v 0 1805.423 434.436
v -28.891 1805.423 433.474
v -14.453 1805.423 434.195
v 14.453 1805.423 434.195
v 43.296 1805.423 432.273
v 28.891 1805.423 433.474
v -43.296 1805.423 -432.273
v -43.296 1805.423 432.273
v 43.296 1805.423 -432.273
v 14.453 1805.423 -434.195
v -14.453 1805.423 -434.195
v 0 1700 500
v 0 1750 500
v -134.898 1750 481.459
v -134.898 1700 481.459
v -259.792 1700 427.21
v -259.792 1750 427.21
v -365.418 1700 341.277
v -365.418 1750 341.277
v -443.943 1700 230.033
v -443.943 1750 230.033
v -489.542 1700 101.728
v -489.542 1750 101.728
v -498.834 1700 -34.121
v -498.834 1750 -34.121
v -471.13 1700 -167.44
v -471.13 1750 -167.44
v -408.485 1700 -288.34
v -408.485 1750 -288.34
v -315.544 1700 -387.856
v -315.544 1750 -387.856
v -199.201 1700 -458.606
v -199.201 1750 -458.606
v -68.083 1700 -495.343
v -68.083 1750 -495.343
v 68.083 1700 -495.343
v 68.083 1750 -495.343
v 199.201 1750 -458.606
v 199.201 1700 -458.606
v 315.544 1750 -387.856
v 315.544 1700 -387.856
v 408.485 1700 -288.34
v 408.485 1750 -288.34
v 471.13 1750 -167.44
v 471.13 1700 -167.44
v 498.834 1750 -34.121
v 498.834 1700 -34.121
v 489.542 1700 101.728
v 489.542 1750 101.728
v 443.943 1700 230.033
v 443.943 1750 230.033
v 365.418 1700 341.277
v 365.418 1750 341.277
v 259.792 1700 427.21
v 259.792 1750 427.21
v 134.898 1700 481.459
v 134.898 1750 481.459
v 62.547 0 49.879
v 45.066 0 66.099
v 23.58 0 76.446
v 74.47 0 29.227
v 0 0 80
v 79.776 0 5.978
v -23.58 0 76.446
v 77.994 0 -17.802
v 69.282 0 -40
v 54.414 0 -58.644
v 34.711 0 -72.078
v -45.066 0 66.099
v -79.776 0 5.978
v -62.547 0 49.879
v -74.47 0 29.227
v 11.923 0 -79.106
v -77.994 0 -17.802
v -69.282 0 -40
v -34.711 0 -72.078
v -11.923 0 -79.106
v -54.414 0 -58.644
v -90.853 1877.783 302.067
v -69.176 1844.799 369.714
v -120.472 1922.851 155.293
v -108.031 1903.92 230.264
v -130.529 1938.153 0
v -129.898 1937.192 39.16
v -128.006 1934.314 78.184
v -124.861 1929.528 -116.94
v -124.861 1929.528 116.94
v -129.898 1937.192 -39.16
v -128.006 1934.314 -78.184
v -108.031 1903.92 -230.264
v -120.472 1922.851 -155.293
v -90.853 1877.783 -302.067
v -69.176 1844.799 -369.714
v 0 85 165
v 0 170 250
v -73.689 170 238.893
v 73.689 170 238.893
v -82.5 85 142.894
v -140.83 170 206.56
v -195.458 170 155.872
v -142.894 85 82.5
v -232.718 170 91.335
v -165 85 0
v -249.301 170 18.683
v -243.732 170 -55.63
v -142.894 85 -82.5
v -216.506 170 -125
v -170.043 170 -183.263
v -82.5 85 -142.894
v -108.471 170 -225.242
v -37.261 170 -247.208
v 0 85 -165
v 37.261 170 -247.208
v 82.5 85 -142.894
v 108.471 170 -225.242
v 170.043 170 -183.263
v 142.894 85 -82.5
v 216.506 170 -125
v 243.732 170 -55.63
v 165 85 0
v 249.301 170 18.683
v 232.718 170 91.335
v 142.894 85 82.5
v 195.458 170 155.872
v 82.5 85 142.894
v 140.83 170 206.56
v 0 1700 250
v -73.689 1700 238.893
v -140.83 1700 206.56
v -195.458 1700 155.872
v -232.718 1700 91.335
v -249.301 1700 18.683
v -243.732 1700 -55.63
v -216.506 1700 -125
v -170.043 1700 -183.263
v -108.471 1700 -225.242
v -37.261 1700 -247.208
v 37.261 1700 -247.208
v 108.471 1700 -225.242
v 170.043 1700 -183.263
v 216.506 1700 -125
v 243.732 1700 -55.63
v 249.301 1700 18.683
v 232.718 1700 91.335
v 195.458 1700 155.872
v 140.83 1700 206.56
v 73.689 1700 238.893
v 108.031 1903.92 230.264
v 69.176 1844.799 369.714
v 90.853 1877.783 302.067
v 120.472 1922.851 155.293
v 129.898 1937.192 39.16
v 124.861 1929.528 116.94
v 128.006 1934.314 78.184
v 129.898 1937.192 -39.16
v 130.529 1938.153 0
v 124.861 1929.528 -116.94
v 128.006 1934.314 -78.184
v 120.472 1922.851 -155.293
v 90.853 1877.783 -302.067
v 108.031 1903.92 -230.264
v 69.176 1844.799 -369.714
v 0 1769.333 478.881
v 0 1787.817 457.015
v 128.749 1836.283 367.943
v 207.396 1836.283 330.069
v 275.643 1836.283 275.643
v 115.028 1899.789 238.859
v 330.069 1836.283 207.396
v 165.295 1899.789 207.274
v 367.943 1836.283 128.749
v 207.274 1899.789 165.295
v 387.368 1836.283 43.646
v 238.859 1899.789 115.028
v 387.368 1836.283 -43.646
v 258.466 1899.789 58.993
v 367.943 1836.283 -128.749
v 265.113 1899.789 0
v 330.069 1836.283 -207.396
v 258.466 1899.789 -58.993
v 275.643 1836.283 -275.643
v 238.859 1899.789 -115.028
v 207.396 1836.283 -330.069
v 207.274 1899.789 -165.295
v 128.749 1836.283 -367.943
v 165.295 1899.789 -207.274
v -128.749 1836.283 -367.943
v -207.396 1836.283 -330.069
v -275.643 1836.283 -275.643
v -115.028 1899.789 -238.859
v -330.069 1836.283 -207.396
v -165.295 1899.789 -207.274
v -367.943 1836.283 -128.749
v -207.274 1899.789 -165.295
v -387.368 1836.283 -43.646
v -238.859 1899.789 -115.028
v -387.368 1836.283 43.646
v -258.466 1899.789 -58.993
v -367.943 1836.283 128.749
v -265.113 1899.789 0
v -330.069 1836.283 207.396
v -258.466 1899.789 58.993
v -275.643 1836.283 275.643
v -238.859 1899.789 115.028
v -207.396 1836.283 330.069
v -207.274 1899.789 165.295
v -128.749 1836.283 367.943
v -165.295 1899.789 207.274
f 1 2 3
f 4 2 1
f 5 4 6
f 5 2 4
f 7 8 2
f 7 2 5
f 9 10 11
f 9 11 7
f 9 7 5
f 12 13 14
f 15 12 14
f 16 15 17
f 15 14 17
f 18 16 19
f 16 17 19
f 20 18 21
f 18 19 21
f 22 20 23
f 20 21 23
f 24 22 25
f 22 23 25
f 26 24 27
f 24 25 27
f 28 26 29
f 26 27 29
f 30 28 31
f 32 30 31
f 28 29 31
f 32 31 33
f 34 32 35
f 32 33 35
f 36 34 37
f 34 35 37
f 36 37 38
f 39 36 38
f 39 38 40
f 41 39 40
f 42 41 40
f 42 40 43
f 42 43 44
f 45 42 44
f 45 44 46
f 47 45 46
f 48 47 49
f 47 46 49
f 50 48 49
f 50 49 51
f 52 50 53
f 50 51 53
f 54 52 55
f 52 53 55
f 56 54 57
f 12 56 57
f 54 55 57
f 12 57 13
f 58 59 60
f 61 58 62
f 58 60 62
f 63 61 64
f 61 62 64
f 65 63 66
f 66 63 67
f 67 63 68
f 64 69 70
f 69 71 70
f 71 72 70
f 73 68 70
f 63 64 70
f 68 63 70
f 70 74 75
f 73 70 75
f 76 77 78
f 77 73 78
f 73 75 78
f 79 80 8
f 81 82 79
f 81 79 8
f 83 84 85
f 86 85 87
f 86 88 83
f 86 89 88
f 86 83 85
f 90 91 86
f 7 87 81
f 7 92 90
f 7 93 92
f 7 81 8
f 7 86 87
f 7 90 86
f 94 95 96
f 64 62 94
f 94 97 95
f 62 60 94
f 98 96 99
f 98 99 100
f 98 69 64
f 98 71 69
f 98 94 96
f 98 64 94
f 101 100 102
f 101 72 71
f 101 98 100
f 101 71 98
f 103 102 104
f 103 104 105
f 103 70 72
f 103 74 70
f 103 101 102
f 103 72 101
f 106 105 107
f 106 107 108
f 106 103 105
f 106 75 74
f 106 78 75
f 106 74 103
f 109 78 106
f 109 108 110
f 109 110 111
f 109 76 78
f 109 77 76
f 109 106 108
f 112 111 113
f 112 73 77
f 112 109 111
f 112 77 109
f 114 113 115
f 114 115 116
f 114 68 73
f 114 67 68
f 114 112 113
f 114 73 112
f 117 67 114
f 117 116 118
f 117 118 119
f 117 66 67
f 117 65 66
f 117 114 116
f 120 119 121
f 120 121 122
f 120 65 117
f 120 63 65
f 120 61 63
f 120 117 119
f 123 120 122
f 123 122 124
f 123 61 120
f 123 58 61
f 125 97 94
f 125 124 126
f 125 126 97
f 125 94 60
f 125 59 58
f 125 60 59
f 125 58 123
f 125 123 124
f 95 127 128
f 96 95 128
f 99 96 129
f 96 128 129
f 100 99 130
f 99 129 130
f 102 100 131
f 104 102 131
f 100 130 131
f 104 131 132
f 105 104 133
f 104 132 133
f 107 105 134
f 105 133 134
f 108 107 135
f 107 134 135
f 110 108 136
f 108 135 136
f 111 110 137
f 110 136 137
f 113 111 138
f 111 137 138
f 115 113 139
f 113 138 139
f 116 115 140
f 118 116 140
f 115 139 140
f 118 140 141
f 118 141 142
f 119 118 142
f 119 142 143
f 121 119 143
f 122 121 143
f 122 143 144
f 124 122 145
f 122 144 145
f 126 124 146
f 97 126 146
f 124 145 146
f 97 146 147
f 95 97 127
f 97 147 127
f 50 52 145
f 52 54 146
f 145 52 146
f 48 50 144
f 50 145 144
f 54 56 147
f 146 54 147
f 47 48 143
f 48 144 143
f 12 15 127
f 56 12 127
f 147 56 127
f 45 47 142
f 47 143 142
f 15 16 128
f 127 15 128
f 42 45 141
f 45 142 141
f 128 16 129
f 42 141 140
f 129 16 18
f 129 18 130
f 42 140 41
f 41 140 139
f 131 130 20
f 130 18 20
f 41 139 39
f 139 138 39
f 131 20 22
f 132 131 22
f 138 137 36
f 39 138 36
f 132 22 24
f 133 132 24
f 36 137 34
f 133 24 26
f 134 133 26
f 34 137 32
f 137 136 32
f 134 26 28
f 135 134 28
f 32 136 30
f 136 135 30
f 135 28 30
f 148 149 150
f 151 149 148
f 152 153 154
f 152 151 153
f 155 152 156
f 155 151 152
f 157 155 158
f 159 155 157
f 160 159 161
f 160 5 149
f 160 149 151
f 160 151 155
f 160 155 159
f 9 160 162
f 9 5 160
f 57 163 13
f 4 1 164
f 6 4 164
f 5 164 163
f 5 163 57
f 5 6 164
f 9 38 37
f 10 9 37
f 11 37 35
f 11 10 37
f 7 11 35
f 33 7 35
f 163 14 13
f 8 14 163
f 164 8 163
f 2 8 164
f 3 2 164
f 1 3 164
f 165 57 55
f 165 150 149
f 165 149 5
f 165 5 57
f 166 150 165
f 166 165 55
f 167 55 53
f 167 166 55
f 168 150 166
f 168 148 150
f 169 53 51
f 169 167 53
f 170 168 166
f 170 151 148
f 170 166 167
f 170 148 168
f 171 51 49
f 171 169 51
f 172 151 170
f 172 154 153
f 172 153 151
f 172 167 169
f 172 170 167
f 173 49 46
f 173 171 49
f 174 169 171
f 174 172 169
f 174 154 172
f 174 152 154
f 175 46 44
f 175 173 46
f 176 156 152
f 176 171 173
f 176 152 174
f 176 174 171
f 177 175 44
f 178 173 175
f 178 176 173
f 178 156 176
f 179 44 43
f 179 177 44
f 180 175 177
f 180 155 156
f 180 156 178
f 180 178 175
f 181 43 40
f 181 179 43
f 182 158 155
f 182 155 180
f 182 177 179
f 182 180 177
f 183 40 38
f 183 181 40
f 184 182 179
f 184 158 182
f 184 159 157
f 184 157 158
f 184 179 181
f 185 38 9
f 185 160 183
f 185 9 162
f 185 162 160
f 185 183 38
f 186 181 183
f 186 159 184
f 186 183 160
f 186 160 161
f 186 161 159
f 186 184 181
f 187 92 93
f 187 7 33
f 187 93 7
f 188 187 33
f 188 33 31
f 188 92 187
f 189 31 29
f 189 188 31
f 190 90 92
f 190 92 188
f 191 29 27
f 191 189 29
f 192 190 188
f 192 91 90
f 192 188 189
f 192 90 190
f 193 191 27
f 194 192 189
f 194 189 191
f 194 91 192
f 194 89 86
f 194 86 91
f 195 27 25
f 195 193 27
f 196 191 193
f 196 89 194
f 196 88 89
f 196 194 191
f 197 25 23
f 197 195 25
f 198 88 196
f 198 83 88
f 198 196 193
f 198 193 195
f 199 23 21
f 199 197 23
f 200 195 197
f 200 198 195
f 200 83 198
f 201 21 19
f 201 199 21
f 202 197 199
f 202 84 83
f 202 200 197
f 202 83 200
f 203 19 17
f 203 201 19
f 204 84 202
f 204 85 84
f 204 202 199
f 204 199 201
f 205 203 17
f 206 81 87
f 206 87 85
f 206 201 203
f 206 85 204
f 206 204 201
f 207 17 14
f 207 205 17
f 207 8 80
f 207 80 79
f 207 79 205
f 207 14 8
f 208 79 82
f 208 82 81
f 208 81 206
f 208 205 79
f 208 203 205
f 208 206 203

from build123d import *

# Parameters (mm, degrees)
DOME1_FACE_RADIUS       = 500
DOME1_HEIGHT            = 200
CUT_EXTRUDE1_DEPTH      = 2075.246851269
CUT_EXTRUDE1_DEPTH_BACK = 2075.246851269
CHAMFER5_SIZE           = 170


with BuildPart() as part:
    # Sketch1 → Revolve1 (revolve)
    with BuildSketch(Plane.XY, mode=Mode.PRIVATE) as revolve1_sk:
        Polygon((0, 0), (-250, 0), (-250, 1700), (-500, 1700), (-500, 1750), (0, 1750), align=None)
    revolve(revolve1_sk.sketch.rotate(Axis((0, 0, 0), (0, -1, 0)), 270), axis=Axis((0, 0, 0), (0, -1, 0)))

    # Dome1: a dome of height H over a round flat face of radius A is a cap of a sphere of radius (A * A + H * H) / (2 * H)
    dome1_r = (DOME1_FACE_RADIUS * DOME1_FACE_RADIUS + DOME1_HEIGHT * DOME1_HEIGHT) / (2 * DOME1_HEIGHT)
    dome1_base = Plane((0, 1750, 0), z_dir=(0, 1, 0))
    with Locations(dome1_base.offset(DOME1_HEIGHT - dome1_r)):
        dome1_ball = Sphere(dome1_r, mode=Mode.PRIVATE)
    add(split(dome1_ball, bisect_by=dome1_base, keep=Keep.TOP, mode=Mode.PRIVATE))

    # Sketch2 → Cut-Extrude1 (cut, two sides: drawn at the far end of the back side and taken through both)
    with BuildSketch(Plane.XY.offset(-CUT_EXTRUDE1_DEPTH_BACK)):
        Polygon((-2374.803234017, 5352.955339177), (-130.529221516, 1938.152944557), (-43.296369992, 1805.422739327), (43.296369992, 1805.422739327), (130.529221516, 1938.152944557), (2374.803234017, 5352.955339177), (2374.803234017, 13525.50481593), (-2374.803234017, 13525.50481593), align=None)
    extrude(amount=CUT_EXTRUDE1_DEPTH + CUT_EXTRUDE1_DEPTH_BACK, mode=Mode.SUBTRACT)

    # Chamfer5
    chamfer5_edges = [part.edges().sort_by_distance(p)[0] for p in [
        (0, 0, -250),
    ]]
    chamfer(chamfer5_edges, length=CHAMFER5_SIZE)


solid = part.part
